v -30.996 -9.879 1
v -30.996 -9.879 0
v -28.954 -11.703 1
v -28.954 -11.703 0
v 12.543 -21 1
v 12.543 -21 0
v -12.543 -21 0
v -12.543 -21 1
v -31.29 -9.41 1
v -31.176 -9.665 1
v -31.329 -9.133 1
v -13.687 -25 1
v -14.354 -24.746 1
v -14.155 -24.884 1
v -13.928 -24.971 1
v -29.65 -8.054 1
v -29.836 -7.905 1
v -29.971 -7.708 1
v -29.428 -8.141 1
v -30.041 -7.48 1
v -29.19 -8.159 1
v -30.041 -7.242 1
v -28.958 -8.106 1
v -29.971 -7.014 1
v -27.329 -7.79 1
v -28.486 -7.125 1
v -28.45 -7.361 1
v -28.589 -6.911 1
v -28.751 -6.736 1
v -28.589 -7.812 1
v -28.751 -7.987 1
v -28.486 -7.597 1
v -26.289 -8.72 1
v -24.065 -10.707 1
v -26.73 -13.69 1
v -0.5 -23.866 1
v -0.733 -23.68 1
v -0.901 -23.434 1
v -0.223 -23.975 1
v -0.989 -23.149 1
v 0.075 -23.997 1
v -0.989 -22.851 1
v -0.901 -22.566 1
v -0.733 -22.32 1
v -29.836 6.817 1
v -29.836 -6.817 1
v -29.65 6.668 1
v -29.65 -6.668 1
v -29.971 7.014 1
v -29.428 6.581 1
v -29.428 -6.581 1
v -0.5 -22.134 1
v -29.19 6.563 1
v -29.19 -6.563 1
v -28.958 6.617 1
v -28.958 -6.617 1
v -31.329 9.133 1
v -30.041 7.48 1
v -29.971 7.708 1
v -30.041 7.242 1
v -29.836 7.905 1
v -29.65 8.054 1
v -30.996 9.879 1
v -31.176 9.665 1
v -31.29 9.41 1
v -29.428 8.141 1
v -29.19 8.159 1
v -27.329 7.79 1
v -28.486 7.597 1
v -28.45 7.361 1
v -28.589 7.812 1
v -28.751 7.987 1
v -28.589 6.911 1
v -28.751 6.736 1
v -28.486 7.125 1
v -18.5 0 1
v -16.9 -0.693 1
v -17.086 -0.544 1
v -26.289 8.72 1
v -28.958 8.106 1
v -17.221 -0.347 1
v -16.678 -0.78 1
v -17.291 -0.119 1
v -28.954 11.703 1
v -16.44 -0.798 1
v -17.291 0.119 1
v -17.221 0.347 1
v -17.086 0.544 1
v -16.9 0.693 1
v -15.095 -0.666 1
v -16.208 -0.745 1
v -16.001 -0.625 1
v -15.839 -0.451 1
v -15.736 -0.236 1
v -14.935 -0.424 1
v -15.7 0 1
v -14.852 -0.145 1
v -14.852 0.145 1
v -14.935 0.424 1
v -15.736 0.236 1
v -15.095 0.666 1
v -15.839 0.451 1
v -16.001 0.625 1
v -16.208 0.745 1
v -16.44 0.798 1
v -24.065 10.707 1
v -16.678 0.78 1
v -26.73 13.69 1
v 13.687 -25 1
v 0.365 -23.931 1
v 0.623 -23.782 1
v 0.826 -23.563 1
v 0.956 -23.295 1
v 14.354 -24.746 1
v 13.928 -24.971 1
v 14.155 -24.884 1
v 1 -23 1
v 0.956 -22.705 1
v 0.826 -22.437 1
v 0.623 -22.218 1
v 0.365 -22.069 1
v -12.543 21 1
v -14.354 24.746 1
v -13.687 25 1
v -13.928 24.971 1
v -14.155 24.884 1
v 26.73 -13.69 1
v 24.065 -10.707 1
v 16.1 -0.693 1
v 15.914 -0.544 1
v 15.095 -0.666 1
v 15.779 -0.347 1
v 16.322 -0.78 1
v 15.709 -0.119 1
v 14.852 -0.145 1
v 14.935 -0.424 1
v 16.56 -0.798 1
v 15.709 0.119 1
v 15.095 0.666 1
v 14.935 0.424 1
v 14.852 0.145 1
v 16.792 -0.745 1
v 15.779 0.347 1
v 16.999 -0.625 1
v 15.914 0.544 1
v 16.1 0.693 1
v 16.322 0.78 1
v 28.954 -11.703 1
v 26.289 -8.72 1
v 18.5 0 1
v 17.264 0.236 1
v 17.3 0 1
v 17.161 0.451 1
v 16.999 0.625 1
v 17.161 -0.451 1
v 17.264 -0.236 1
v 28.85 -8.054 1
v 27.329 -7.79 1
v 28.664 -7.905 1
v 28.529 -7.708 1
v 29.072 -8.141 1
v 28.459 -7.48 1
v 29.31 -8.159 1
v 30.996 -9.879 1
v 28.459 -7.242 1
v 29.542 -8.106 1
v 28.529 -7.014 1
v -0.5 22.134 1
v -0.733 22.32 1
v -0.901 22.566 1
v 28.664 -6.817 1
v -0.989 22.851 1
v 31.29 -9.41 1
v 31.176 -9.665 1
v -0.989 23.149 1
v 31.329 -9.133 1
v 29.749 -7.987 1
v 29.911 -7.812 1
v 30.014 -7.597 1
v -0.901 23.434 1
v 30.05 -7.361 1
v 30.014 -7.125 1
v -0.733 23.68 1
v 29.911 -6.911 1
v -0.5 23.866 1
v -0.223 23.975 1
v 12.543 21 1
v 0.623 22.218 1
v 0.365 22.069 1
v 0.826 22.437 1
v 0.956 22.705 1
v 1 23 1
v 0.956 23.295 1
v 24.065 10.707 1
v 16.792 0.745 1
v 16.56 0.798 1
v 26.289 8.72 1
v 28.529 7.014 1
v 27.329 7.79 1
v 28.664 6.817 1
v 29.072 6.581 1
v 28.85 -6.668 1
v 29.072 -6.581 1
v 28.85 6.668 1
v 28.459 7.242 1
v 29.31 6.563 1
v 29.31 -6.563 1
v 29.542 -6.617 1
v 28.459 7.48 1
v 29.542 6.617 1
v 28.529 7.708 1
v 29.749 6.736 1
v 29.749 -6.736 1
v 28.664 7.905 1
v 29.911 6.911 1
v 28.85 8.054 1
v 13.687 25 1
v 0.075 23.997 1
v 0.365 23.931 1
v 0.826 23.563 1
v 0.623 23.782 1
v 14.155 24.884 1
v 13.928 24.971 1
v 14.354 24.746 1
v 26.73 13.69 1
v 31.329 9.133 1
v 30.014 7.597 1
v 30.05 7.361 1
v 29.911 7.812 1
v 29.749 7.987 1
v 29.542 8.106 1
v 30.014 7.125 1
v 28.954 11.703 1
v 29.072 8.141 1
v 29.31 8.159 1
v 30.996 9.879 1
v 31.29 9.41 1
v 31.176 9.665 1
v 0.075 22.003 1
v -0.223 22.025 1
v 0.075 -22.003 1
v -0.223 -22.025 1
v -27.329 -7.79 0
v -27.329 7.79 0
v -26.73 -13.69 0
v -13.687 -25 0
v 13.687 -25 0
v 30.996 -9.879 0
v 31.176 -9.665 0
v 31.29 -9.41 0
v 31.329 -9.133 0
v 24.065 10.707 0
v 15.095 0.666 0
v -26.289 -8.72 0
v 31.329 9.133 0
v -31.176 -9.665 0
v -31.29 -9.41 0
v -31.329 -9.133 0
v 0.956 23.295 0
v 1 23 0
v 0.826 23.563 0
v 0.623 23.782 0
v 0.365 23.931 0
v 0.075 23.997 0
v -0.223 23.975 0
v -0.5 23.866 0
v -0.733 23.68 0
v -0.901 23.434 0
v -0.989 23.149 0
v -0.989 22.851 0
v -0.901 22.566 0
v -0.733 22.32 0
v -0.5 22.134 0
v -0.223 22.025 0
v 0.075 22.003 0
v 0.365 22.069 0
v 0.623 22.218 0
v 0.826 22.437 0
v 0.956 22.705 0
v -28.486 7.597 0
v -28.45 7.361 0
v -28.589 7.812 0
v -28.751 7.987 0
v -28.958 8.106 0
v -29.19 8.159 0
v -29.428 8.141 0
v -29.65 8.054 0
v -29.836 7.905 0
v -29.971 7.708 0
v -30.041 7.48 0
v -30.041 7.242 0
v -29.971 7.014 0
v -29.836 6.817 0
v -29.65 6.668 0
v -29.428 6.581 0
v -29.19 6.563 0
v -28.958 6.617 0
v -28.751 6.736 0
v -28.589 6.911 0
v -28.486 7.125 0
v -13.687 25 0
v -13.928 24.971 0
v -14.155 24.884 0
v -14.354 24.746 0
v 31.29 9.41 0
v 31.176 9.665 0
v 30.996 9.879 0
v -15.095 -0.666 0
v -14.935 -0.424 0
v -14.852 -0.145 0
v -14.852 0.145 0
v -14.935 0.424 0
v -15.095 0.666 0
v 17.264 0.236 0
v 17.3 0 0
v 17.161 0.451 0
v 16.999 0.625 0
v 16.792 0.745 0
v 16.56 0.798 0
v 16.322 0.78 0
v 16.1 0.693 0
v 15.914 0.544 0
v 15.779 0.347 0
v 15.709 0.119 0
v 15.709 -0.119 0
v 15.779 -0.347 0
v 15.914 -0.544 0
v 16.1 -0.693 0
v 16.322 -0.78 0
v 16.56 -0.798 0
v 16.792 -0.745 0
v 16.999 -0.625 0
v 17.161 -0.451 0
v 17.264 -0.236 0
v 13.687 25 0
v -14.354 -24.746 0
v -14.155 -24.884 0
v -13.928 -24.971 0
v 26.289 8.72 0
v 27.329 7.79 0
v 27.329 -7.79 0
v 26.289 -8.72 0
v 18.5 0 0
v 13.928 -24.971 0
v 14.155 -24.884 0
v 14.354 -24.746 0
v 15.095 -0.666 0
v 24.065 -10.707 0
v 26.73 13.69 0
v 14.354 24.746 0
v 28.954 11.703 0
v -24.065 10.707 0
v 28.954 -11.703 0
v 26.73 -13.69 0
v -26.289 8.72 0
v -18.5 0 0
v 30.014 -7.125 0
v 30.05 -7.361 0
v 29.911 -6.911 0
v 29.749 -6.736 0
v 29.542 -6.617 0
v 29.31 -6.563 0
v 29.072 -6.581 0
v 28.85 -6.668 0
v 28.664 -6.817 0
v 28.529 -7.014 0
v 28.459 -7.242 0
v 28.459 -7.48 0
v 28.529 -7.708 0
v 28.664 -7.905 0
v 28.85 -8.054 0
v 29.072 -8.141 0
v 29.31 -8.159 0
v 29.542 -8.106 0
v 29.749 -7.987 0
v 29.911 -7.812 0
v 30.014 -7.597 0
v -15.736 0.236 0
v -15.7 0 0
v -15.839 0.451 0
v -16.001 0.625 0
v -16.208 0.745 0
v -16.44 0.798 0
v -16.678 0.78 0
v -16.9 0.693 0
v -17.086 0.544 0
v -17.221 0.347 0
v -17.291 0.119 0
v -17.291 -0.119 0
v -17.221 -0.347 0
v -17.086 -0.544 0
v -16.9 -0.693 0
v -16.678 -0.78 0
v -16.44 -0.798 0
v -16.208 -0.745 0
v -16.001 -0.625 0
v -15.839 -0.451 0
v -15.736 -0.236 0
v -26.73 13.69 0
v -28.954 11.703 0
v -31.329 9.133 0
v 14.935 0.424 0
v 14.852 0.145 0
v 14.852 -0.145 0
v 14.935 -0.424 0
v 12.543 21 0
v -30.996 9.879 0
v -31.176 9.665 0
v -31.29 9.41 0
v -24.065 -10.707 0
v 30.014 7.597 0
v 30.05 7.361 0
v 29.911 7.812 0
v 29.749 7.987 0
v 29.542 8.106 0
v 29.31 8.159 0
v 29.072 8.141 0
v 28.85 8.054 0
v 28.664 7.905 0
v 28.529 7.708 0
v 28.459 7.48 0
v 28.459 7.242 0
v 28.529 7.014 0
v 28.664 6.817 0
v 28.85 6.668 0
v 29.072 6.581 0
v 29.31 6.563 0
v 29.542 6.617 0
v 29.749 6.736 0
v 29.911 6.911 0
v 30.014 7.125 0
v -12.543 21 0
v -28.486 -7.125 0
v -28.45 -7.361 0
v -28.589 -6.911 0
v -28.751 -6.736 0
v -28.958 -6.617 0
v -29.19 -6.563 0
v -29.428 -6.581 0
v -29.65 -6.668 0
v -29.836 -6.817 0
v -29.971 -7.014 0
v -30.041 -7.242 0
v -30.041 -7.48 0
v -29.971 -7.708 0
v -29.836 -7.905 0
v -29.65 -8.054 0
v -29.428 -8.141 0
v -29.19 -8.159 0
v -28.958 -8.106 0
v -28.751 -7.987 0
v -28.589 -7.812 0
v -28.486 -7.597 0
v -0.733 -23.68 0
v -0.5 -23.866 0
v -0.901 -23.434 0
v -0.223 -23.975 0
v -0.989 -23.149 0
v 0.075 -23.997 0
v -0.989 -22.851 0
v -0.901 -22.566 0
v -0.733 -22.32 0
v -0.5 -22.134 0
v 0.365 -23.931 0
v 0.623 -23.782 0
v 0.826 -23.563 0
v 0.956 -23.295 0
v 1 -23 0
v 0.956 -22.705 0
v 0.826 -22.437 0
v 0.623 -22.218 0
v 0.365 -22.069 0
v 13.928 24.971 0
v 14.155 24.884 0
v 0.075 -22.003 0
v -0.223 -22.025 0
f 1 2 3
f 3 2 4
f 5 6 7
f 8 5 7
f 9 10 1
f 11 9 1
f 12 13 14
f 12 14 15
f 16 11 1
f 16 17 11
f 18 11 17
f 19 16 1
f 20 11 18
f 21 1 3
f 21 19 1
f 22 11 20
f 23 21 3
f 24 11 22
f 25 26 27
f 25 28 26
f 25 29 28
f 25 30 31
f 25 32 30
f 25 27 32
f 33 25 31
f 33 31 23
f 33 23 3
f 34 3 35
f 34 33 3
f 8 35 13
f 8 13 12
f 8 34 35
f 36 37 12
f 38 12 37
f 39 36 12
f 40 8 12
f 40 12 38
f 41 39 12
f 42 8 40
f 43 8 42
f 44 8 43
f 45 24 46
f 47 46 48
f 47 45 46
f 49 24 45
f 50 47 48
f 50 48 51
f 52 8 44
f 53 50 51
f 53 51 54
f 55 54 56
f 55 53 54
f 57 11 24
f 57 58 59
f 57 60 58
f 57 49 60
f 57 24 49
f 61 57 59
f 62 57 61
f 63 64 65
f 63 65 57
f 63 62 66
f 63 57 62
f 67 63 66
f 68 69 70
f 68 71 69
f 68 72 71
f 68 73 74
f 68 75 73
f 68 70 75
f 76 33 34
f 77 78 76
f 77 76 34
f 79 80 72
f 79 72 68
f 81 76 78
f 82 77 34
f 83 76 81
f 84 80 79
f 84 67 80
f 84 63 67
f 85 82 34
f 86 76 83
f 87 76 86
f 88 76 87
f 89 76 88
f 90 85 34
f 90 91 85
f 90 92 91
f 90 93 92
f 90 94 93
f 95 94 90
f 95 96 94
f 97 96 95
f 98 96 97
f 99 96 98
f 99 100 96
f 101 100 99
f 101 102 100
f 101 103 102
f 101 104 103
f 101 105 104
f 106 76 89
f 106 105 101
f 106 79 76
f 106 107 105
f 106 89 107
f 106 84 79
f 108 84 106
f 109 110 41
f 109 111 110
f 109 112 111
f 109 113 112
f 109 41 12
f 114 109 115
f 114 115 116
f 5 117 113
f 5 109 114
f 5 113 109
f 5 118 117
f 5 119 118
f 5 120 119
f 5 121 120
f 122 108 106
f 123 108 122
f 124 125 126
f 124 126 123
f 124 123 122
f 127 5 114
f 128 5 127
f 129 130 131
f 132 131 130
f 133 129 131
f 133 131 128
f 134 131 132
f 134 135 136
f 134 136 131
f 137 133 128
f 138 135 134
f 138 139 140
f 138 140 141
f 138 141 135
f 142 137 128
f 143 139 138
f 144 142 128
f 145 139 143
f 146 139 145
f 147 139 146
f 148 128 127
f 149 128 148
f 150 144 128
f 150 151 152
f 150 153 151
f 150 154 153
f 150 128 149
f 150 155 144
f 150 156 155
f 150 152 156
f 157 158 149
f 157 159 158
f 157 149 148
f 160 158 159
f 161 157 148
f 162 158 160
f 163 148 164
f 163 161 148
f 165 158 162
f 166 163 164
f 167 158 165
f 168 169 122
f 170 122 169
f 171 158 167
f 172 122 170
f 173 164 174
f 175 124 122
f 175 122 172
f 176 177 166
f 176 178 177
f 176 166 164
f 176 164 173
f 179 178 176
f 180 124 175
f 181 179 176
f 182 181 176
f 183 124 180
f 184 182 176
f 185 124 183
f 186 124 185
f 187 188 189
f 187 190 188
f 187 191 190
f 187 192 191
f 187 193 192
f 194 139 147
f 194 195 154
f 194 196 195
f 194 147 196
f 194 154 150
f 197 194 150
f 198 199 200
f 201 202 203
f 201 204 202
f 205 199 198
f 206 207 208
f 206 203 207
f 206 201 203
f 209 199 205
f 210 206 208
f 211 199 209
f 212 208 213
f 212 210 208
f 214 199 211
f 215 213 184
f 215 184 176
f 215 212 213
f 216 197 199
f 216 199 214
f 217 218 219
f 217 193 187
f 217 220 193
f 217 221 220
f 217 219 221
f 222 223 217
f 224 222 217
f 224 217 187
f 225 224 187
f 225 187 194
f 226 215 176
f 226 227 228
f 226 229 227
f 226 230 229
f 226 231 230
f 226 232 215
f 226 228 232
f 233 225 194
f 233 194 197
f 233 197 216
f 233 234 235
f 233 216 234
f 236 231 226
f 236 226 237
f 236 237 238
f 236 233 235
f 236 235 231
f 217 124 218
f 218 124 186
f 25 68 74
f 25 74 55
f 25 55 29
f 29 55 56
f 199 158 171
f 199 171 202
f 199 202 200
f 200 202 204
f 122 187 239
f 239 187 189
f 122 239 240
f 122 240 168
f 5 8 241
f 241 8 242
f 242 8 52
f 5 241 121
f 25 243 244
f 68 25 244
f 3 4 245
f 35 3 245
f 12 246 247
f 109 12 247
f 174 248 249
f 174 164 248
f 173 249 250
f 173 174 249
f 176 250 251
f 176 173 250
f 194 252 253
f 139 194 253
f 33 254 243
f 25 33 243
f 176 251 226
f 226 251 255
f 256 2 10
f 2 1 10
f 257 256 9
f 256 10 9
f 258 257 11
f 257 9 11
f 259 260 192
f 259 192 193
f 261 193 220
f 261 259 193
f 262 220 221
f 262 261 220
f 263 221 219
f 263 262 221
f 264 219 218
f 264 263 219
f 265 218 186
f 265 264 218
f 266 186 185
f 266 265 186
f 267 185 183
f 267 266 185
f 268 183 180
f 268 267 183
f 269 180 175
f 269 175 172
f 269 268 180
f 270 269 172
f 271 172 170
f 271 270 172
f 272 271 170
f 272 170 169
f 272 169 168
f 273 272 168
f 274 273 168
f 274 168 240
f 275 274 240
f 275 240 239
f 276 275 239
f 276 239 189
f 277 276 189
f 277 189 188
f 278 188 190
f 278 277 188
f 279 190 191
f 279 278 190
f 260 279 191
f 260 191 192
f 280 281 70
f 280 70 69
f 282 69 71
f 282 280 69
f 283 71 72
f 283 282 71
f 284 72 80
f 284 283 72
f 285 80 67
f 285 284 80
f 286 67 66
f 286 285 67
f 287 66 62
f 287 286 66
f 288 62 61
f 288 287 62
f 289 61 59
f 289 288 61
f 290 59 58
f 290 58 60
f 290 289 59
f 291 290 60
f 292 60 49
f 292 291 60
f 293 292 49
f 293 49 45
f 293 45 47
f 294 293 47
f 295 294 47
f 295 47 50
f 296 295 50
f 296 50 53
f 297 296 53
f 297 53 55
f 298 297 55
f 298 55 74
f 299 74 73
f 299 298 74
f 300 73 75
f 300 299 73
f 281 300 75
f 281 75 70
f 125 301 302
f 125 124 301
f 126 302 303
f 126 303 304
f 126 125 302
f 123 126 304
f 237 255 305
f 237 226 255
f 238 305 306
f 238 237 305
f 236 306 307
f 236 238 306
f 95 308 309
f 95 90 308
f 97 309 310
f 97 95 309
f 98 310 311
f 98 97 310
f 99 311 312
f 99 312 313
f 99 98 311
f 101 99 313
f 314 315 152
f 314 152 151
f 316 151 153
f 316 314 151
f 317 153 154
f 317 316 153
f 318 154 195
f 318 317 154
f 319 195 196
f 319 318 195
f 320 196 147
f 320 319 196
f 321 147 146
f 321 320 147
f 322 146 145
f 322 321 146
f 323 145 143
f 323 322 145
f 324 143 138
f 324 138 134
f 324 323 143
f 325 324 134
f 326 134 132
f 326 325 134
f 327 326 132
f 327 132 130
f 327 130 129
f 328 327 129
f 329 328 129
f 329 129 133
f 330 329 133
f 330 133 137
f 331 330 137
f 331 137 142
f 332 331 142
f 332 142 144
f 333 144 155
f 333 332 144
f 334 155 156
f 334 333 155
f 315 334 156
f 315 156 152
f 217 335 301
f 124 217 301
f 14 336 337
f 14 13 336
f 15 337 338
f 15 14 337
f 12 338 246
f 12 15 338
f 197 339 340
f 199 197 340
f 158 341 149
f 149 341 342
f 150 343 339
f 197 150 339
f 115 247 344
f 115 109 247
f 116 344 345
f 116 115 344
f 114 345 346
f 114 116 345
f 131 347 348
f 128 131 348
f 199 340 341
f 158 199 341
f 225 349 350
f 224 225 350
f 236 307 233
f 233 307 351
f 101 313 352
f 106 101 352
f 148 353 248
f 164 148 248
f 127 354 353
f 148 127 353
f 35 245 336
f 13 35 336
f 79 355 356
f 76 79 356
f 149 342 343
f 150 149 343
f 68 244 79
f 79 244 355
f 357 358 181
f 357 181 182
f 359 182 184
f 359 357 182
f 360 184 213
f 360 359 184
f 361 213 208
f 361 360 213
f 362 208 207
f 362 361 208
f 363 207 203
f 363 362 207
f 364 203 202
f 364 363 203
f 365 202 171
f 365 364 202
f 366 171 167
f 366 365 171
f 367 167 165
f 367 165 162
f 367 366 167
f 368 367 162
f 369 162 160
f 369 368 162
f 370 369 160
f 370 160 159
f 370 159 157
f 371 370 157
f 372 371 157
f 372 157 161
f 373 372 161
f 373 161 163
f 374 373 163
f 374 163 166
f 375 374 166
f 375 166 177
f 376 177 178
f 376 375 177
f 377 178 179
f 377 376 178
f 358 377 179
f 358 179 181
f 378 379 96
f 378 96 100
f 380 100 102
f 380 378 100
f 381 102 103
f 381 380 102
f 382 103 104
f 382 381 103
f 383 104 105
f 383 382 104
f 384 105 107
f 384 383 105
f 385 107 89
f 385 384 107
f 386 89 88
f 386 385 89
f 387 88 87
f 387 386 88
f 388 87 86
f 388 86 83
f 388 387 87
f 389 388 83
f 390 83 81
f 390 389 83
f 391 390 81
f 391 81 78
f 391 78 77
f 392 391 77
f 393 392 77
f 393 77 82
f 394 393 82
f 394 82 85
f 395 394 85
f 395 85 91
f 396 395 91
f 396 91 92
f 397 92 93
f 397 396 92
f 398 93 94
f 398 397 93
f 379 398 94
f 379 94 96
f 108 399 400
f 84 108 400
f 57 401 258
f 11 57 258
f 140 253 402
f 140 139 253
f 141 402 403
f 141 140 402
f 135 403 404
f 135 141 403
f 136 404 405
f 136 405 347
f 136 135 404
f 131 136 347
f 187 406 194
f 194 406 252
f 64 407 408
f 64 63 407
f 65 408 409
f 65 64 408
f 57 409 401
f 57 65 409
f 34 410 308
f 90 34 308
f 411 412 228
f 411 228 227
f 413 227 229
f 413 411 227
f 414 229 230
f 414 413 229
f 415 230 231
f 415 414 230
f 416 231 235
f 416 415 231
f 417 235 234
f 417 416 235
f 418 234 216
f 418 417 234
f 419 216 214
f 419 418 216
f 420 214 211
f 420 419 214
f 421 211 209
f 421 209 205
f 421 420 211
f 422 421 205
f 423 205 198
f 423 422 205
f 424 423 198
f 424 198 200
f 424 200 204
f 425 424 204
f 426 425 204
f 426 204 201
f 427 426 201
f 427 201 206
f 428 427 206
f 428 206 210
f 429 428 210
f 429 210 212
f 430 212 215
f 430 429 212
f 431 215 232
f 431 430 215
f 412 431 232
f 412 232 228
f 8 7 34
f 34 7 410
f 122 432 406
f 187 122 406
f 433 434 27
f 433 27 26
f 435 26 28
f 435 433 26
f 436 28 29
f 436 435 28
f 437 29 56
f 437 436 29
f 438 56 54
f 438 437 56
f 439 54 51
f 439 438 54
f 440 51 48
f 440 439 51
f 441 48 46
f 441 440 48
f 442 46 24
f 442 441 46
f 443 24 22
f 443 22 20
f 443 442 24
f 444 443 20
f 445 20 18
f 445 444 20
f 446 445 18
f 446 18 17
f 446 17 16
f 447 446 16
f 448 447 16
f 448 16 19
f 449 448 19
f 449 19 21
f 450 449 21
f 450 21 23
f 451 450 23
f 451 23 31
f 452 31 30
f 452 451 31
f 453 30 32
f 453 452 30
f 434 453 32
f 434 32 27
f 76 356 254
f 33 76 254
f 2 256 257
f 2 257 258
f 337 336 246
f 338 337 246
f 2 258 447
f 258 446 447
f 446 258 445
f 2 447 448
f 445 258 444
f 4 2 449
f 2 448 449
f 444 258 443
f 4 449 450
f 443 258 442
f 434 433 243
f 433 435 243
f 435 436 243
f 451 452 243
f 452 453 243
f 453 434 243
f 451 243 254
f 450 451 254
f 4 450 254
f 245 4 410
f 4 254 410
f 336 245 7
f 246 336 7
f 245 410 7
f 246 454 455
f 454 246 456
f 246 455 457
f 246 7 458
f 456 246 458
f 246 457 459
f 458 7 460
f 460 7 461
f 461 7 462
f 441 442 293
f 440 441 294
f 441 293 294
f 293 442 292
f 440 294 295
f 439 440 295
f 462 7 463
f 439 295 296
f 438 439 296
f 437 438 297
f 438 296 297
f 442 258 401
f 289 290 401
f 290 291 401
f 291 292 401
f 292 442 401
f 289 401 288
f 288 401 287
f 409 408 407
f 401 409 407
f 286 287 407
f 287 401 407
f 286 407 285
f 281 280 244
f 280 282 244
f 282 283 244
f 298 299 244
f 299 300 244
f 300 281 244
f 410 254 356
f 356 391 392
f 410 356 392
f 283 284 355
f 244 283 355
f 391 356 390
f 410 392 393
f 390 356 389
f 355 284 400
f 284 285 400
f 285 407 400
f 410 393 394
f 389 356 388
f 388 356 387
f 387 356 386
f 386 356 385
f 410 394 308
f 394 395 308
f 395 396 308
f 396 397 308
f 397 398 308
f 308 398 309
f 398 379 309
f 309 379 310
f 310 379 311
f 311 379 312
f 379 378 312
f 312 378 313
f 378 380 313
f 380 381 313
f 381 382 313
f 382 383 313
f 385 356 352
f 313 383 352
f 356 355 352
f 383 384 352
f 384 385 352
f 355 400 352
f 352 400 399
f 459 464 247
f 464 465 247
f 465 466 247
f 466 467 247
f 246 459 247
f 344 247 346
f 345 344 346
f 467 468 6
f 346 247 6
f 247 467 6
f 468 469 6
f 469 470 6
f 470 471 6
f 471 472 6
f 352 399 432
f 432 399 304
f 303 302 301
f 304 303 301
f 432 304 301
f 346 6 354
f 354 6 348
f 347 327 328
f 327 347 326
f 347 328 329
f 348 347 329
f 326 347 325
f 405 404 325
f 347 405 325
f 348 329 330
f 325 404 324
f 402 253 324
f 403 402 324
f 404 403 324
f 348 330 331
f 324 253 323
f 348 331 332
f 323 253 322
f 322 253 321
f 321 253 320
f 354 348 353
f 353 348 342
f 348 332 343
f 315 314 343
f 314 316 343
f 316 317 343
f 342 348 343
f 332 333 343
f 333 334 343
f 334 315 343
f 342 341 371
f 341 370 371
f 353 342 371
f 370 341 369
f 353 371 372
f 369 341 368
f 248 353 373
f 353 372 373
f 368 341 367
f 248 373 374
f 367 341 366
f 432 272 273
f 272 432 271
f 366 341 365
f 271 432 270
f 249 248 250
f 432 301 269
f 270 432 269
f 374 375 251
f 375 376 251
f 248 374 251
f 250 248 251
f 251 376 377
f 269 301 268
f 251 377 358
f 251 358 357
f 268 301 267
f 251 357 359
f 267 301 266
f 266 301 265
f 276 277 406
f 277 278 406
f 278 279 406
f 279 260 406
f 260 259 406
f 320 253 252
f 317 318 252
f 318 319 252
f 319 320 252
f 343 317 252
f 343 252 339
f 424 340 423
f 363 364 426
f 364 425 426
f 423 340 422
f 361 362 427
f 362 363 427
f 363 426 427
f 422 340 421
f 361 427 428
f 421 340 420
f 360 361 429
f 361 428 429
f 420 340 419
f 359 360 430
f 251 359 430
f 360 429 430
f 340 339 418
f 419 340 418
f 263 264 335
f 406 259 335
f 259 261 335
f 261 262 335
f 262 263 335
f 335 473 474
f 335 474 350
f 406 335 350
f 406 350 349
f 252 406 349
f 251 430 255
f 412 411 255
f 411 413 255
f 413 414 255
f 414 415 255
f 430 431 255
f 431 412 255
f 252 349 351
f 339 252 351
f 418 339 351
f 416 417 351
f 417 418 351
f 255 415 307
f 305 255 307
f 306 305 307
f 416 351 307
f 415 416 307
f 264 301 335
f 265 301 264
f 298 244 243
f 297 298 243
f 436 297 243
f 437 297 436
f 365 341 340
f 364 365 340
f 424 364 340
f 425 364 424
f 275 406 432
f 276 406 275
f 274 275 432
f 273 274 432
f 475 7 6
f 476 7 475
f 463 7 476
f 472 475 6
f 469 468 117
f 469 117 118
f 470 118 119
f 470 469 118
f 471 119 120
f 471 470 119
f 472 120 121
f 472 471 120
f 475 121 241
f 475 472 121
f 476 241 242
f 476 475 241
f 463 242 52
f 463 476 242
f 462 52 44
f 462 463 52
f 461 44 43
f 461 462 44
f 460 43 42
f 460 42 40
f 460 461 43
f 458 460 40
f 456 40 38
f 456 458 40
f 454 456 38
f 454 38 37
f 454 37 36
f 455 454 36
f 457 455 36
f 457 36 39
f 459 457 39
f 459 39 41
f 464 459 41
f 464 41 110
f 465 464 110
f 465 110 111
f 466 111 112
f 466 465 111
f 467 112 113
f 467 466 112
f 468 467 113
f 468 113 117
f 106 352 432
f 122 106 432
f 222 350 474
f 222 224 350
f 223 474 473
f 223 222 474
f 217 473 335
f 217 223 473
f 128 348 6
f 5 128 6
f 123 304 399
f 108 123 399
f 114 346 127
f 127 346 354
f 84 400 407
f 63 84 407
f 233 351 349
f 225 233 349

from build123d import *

# Parameters (mm, degrees)
F0_R     = 1
F0_R_2   = 0.8
F1_DEPTH = 1
F2_R     = 1


with BuildPart() as f1:
    # F0 (on Top) → F1 (new body)
    with BuildSketch(Plane.XY):
        Polygon((14.0690184001, 25), (0, 25), (-14.0690184001, 25), (-26.7296075576, 13.6899425008), (-24.0647631939, 10.7068896154), (-12.5425545984, 21), (0, 21), (12.5425545984, 21), (24.0647631939, 10.7068896154), (26.7296075576, 13.6899425008), align=None)
        with Locations((0, 23)):
            Circle(F0_R, mode=Mode.SUBTRACT)
        Polygon((28.9542586869, 11.7025995837), (26.7296075576, 13.6899425008), (24.0647631939, 10.7068896154), (26.2894143232, 8.7195466983), align=None)
        Polygon((-24.0647631939, 10.7068896154), (-26.7296075576, 13.6899425008), (-28.9542586869, 11.7025995837), (-26.2894143232, 8.7195466983), align=None)
        Polygon((31.3294992745, 9.5807309025), (28.9542586869, 11.7025995837), (26.2894143232, 8.7195466983), (27.3294992745, 7.7904097951), (27.3294992745, 0.0814010352), (27.3294992745, -0.0814010352), (27.3294992745, -7.7904097951), (26.2894143232, -8.7195466983), (28.9542586869, -11.7025995837), (31.3294992745, -9.5807309025), (31.3294992745, 0), align=None)
        with Locations((29.25, -7.3612159322)):
            Circle(F0_R_2, mode=Mode.SUBTRACT)
        with Locations((29.25, 7.3612159322)):
            Circle(F0_R_2, mode=Mode.SUBTRACT)
        Polygon((26.2894143232, 8.7195466983), (24.0647631939, 10.7068896154), (14.5, 0), (24.0647631939, -10.7068896154), (26.2894143232, -8.7195466983), (18.5, 0), align=None)
        with Locations((16.5, 0)):
            Circle(F0_R_2, mode=Mode.SUBTRACT)
        Polygon((-26.2894143232, 8.7195466983), (-28.9542586869, 11.7025995837), (-31.3294992745, 9.5807309025), (-31.3294992745, 0), (-31.3294992745, -9.5807309025), (-28.9542586869, -11.7025995837), (-26.2894143232, -8.7195466983), (-27.3294992745, -7.7904097951), (-27.3294992745, -0.0814010352), (-27.3294992745, 0.0814010352), (-27.3294992745, 7.7904097951), align=None)
        with Locations((-29.25, -7.3612159322)):
            Circle(F0_R_2, mode=Mode.SUBTRACT)
        with Locations((-29.25, 7.3612159322)):
            Circle(F0_R_2, mode=Mode.SUBTRACT)
        Polygon((-14.5, 0), (-24.0647631939, 10.7068896154), (-26.2894143232, 8.7195466983), (-18.5, 0), (-26.2894143232, -8.7195466983), (-24.0647631939, -10.7068896154), align=None)
        with Locations((-16.5, 0)):
            Circle(F0_R_2, mode=Mode.SUBTRACT)
        Polygon((26.2894143232, -8.7195466983), (24.0647631939, -10.7068896154), (26.7296075576, -13.6899425008), (28.9542586869, -11.7025995837), align=None)
        Polygon((26.7296075576, -13.6899425008), (24.0647631939, -10.7068896154), (12.5425545984, -21), (0, -21), (-12.5425545984, -21), (-24.0647631939, -10.7068896154), (-26.7296075576, -13.6899425008), (-14.0690184001, -25), (0, -25), (14.0690184001, -25), align=None)
        with Locations((0, -23)):
            Circle(F0_R, mode=Mode.SUBTRACT)
        Polygon((-26.7296075576, -13.6899425008), (-24.0647631939, -10.7068896154), (-26.2894143232, -8.7195466983), (-28.9542586869, -11.7025995837), align=None)
    extrude(amount=F1_DEPTH)

    # F2
    f2_edges = [f1.edges().sort_by_distance(p)[0] for p in [
        (-14.069018, 25, 0.5),
        (-31.329499, 9.580731, 0.5),
        (-31.329499, -9.580731, 0.5),
        (-14.069018, -25, 0.5),
        (14.069018, -25, 0.5),
        (31.329499, -9.580731, 0.5),
        (31.329499, 9.580731, 0.5),
        (14.069018, 25, 0.5),
        (14.5, 0, 0.5),
        (-14.5, 0, 0.5),
    ]]
    fillet(f2_edges, radius=F2_R)


solid = f1.part
